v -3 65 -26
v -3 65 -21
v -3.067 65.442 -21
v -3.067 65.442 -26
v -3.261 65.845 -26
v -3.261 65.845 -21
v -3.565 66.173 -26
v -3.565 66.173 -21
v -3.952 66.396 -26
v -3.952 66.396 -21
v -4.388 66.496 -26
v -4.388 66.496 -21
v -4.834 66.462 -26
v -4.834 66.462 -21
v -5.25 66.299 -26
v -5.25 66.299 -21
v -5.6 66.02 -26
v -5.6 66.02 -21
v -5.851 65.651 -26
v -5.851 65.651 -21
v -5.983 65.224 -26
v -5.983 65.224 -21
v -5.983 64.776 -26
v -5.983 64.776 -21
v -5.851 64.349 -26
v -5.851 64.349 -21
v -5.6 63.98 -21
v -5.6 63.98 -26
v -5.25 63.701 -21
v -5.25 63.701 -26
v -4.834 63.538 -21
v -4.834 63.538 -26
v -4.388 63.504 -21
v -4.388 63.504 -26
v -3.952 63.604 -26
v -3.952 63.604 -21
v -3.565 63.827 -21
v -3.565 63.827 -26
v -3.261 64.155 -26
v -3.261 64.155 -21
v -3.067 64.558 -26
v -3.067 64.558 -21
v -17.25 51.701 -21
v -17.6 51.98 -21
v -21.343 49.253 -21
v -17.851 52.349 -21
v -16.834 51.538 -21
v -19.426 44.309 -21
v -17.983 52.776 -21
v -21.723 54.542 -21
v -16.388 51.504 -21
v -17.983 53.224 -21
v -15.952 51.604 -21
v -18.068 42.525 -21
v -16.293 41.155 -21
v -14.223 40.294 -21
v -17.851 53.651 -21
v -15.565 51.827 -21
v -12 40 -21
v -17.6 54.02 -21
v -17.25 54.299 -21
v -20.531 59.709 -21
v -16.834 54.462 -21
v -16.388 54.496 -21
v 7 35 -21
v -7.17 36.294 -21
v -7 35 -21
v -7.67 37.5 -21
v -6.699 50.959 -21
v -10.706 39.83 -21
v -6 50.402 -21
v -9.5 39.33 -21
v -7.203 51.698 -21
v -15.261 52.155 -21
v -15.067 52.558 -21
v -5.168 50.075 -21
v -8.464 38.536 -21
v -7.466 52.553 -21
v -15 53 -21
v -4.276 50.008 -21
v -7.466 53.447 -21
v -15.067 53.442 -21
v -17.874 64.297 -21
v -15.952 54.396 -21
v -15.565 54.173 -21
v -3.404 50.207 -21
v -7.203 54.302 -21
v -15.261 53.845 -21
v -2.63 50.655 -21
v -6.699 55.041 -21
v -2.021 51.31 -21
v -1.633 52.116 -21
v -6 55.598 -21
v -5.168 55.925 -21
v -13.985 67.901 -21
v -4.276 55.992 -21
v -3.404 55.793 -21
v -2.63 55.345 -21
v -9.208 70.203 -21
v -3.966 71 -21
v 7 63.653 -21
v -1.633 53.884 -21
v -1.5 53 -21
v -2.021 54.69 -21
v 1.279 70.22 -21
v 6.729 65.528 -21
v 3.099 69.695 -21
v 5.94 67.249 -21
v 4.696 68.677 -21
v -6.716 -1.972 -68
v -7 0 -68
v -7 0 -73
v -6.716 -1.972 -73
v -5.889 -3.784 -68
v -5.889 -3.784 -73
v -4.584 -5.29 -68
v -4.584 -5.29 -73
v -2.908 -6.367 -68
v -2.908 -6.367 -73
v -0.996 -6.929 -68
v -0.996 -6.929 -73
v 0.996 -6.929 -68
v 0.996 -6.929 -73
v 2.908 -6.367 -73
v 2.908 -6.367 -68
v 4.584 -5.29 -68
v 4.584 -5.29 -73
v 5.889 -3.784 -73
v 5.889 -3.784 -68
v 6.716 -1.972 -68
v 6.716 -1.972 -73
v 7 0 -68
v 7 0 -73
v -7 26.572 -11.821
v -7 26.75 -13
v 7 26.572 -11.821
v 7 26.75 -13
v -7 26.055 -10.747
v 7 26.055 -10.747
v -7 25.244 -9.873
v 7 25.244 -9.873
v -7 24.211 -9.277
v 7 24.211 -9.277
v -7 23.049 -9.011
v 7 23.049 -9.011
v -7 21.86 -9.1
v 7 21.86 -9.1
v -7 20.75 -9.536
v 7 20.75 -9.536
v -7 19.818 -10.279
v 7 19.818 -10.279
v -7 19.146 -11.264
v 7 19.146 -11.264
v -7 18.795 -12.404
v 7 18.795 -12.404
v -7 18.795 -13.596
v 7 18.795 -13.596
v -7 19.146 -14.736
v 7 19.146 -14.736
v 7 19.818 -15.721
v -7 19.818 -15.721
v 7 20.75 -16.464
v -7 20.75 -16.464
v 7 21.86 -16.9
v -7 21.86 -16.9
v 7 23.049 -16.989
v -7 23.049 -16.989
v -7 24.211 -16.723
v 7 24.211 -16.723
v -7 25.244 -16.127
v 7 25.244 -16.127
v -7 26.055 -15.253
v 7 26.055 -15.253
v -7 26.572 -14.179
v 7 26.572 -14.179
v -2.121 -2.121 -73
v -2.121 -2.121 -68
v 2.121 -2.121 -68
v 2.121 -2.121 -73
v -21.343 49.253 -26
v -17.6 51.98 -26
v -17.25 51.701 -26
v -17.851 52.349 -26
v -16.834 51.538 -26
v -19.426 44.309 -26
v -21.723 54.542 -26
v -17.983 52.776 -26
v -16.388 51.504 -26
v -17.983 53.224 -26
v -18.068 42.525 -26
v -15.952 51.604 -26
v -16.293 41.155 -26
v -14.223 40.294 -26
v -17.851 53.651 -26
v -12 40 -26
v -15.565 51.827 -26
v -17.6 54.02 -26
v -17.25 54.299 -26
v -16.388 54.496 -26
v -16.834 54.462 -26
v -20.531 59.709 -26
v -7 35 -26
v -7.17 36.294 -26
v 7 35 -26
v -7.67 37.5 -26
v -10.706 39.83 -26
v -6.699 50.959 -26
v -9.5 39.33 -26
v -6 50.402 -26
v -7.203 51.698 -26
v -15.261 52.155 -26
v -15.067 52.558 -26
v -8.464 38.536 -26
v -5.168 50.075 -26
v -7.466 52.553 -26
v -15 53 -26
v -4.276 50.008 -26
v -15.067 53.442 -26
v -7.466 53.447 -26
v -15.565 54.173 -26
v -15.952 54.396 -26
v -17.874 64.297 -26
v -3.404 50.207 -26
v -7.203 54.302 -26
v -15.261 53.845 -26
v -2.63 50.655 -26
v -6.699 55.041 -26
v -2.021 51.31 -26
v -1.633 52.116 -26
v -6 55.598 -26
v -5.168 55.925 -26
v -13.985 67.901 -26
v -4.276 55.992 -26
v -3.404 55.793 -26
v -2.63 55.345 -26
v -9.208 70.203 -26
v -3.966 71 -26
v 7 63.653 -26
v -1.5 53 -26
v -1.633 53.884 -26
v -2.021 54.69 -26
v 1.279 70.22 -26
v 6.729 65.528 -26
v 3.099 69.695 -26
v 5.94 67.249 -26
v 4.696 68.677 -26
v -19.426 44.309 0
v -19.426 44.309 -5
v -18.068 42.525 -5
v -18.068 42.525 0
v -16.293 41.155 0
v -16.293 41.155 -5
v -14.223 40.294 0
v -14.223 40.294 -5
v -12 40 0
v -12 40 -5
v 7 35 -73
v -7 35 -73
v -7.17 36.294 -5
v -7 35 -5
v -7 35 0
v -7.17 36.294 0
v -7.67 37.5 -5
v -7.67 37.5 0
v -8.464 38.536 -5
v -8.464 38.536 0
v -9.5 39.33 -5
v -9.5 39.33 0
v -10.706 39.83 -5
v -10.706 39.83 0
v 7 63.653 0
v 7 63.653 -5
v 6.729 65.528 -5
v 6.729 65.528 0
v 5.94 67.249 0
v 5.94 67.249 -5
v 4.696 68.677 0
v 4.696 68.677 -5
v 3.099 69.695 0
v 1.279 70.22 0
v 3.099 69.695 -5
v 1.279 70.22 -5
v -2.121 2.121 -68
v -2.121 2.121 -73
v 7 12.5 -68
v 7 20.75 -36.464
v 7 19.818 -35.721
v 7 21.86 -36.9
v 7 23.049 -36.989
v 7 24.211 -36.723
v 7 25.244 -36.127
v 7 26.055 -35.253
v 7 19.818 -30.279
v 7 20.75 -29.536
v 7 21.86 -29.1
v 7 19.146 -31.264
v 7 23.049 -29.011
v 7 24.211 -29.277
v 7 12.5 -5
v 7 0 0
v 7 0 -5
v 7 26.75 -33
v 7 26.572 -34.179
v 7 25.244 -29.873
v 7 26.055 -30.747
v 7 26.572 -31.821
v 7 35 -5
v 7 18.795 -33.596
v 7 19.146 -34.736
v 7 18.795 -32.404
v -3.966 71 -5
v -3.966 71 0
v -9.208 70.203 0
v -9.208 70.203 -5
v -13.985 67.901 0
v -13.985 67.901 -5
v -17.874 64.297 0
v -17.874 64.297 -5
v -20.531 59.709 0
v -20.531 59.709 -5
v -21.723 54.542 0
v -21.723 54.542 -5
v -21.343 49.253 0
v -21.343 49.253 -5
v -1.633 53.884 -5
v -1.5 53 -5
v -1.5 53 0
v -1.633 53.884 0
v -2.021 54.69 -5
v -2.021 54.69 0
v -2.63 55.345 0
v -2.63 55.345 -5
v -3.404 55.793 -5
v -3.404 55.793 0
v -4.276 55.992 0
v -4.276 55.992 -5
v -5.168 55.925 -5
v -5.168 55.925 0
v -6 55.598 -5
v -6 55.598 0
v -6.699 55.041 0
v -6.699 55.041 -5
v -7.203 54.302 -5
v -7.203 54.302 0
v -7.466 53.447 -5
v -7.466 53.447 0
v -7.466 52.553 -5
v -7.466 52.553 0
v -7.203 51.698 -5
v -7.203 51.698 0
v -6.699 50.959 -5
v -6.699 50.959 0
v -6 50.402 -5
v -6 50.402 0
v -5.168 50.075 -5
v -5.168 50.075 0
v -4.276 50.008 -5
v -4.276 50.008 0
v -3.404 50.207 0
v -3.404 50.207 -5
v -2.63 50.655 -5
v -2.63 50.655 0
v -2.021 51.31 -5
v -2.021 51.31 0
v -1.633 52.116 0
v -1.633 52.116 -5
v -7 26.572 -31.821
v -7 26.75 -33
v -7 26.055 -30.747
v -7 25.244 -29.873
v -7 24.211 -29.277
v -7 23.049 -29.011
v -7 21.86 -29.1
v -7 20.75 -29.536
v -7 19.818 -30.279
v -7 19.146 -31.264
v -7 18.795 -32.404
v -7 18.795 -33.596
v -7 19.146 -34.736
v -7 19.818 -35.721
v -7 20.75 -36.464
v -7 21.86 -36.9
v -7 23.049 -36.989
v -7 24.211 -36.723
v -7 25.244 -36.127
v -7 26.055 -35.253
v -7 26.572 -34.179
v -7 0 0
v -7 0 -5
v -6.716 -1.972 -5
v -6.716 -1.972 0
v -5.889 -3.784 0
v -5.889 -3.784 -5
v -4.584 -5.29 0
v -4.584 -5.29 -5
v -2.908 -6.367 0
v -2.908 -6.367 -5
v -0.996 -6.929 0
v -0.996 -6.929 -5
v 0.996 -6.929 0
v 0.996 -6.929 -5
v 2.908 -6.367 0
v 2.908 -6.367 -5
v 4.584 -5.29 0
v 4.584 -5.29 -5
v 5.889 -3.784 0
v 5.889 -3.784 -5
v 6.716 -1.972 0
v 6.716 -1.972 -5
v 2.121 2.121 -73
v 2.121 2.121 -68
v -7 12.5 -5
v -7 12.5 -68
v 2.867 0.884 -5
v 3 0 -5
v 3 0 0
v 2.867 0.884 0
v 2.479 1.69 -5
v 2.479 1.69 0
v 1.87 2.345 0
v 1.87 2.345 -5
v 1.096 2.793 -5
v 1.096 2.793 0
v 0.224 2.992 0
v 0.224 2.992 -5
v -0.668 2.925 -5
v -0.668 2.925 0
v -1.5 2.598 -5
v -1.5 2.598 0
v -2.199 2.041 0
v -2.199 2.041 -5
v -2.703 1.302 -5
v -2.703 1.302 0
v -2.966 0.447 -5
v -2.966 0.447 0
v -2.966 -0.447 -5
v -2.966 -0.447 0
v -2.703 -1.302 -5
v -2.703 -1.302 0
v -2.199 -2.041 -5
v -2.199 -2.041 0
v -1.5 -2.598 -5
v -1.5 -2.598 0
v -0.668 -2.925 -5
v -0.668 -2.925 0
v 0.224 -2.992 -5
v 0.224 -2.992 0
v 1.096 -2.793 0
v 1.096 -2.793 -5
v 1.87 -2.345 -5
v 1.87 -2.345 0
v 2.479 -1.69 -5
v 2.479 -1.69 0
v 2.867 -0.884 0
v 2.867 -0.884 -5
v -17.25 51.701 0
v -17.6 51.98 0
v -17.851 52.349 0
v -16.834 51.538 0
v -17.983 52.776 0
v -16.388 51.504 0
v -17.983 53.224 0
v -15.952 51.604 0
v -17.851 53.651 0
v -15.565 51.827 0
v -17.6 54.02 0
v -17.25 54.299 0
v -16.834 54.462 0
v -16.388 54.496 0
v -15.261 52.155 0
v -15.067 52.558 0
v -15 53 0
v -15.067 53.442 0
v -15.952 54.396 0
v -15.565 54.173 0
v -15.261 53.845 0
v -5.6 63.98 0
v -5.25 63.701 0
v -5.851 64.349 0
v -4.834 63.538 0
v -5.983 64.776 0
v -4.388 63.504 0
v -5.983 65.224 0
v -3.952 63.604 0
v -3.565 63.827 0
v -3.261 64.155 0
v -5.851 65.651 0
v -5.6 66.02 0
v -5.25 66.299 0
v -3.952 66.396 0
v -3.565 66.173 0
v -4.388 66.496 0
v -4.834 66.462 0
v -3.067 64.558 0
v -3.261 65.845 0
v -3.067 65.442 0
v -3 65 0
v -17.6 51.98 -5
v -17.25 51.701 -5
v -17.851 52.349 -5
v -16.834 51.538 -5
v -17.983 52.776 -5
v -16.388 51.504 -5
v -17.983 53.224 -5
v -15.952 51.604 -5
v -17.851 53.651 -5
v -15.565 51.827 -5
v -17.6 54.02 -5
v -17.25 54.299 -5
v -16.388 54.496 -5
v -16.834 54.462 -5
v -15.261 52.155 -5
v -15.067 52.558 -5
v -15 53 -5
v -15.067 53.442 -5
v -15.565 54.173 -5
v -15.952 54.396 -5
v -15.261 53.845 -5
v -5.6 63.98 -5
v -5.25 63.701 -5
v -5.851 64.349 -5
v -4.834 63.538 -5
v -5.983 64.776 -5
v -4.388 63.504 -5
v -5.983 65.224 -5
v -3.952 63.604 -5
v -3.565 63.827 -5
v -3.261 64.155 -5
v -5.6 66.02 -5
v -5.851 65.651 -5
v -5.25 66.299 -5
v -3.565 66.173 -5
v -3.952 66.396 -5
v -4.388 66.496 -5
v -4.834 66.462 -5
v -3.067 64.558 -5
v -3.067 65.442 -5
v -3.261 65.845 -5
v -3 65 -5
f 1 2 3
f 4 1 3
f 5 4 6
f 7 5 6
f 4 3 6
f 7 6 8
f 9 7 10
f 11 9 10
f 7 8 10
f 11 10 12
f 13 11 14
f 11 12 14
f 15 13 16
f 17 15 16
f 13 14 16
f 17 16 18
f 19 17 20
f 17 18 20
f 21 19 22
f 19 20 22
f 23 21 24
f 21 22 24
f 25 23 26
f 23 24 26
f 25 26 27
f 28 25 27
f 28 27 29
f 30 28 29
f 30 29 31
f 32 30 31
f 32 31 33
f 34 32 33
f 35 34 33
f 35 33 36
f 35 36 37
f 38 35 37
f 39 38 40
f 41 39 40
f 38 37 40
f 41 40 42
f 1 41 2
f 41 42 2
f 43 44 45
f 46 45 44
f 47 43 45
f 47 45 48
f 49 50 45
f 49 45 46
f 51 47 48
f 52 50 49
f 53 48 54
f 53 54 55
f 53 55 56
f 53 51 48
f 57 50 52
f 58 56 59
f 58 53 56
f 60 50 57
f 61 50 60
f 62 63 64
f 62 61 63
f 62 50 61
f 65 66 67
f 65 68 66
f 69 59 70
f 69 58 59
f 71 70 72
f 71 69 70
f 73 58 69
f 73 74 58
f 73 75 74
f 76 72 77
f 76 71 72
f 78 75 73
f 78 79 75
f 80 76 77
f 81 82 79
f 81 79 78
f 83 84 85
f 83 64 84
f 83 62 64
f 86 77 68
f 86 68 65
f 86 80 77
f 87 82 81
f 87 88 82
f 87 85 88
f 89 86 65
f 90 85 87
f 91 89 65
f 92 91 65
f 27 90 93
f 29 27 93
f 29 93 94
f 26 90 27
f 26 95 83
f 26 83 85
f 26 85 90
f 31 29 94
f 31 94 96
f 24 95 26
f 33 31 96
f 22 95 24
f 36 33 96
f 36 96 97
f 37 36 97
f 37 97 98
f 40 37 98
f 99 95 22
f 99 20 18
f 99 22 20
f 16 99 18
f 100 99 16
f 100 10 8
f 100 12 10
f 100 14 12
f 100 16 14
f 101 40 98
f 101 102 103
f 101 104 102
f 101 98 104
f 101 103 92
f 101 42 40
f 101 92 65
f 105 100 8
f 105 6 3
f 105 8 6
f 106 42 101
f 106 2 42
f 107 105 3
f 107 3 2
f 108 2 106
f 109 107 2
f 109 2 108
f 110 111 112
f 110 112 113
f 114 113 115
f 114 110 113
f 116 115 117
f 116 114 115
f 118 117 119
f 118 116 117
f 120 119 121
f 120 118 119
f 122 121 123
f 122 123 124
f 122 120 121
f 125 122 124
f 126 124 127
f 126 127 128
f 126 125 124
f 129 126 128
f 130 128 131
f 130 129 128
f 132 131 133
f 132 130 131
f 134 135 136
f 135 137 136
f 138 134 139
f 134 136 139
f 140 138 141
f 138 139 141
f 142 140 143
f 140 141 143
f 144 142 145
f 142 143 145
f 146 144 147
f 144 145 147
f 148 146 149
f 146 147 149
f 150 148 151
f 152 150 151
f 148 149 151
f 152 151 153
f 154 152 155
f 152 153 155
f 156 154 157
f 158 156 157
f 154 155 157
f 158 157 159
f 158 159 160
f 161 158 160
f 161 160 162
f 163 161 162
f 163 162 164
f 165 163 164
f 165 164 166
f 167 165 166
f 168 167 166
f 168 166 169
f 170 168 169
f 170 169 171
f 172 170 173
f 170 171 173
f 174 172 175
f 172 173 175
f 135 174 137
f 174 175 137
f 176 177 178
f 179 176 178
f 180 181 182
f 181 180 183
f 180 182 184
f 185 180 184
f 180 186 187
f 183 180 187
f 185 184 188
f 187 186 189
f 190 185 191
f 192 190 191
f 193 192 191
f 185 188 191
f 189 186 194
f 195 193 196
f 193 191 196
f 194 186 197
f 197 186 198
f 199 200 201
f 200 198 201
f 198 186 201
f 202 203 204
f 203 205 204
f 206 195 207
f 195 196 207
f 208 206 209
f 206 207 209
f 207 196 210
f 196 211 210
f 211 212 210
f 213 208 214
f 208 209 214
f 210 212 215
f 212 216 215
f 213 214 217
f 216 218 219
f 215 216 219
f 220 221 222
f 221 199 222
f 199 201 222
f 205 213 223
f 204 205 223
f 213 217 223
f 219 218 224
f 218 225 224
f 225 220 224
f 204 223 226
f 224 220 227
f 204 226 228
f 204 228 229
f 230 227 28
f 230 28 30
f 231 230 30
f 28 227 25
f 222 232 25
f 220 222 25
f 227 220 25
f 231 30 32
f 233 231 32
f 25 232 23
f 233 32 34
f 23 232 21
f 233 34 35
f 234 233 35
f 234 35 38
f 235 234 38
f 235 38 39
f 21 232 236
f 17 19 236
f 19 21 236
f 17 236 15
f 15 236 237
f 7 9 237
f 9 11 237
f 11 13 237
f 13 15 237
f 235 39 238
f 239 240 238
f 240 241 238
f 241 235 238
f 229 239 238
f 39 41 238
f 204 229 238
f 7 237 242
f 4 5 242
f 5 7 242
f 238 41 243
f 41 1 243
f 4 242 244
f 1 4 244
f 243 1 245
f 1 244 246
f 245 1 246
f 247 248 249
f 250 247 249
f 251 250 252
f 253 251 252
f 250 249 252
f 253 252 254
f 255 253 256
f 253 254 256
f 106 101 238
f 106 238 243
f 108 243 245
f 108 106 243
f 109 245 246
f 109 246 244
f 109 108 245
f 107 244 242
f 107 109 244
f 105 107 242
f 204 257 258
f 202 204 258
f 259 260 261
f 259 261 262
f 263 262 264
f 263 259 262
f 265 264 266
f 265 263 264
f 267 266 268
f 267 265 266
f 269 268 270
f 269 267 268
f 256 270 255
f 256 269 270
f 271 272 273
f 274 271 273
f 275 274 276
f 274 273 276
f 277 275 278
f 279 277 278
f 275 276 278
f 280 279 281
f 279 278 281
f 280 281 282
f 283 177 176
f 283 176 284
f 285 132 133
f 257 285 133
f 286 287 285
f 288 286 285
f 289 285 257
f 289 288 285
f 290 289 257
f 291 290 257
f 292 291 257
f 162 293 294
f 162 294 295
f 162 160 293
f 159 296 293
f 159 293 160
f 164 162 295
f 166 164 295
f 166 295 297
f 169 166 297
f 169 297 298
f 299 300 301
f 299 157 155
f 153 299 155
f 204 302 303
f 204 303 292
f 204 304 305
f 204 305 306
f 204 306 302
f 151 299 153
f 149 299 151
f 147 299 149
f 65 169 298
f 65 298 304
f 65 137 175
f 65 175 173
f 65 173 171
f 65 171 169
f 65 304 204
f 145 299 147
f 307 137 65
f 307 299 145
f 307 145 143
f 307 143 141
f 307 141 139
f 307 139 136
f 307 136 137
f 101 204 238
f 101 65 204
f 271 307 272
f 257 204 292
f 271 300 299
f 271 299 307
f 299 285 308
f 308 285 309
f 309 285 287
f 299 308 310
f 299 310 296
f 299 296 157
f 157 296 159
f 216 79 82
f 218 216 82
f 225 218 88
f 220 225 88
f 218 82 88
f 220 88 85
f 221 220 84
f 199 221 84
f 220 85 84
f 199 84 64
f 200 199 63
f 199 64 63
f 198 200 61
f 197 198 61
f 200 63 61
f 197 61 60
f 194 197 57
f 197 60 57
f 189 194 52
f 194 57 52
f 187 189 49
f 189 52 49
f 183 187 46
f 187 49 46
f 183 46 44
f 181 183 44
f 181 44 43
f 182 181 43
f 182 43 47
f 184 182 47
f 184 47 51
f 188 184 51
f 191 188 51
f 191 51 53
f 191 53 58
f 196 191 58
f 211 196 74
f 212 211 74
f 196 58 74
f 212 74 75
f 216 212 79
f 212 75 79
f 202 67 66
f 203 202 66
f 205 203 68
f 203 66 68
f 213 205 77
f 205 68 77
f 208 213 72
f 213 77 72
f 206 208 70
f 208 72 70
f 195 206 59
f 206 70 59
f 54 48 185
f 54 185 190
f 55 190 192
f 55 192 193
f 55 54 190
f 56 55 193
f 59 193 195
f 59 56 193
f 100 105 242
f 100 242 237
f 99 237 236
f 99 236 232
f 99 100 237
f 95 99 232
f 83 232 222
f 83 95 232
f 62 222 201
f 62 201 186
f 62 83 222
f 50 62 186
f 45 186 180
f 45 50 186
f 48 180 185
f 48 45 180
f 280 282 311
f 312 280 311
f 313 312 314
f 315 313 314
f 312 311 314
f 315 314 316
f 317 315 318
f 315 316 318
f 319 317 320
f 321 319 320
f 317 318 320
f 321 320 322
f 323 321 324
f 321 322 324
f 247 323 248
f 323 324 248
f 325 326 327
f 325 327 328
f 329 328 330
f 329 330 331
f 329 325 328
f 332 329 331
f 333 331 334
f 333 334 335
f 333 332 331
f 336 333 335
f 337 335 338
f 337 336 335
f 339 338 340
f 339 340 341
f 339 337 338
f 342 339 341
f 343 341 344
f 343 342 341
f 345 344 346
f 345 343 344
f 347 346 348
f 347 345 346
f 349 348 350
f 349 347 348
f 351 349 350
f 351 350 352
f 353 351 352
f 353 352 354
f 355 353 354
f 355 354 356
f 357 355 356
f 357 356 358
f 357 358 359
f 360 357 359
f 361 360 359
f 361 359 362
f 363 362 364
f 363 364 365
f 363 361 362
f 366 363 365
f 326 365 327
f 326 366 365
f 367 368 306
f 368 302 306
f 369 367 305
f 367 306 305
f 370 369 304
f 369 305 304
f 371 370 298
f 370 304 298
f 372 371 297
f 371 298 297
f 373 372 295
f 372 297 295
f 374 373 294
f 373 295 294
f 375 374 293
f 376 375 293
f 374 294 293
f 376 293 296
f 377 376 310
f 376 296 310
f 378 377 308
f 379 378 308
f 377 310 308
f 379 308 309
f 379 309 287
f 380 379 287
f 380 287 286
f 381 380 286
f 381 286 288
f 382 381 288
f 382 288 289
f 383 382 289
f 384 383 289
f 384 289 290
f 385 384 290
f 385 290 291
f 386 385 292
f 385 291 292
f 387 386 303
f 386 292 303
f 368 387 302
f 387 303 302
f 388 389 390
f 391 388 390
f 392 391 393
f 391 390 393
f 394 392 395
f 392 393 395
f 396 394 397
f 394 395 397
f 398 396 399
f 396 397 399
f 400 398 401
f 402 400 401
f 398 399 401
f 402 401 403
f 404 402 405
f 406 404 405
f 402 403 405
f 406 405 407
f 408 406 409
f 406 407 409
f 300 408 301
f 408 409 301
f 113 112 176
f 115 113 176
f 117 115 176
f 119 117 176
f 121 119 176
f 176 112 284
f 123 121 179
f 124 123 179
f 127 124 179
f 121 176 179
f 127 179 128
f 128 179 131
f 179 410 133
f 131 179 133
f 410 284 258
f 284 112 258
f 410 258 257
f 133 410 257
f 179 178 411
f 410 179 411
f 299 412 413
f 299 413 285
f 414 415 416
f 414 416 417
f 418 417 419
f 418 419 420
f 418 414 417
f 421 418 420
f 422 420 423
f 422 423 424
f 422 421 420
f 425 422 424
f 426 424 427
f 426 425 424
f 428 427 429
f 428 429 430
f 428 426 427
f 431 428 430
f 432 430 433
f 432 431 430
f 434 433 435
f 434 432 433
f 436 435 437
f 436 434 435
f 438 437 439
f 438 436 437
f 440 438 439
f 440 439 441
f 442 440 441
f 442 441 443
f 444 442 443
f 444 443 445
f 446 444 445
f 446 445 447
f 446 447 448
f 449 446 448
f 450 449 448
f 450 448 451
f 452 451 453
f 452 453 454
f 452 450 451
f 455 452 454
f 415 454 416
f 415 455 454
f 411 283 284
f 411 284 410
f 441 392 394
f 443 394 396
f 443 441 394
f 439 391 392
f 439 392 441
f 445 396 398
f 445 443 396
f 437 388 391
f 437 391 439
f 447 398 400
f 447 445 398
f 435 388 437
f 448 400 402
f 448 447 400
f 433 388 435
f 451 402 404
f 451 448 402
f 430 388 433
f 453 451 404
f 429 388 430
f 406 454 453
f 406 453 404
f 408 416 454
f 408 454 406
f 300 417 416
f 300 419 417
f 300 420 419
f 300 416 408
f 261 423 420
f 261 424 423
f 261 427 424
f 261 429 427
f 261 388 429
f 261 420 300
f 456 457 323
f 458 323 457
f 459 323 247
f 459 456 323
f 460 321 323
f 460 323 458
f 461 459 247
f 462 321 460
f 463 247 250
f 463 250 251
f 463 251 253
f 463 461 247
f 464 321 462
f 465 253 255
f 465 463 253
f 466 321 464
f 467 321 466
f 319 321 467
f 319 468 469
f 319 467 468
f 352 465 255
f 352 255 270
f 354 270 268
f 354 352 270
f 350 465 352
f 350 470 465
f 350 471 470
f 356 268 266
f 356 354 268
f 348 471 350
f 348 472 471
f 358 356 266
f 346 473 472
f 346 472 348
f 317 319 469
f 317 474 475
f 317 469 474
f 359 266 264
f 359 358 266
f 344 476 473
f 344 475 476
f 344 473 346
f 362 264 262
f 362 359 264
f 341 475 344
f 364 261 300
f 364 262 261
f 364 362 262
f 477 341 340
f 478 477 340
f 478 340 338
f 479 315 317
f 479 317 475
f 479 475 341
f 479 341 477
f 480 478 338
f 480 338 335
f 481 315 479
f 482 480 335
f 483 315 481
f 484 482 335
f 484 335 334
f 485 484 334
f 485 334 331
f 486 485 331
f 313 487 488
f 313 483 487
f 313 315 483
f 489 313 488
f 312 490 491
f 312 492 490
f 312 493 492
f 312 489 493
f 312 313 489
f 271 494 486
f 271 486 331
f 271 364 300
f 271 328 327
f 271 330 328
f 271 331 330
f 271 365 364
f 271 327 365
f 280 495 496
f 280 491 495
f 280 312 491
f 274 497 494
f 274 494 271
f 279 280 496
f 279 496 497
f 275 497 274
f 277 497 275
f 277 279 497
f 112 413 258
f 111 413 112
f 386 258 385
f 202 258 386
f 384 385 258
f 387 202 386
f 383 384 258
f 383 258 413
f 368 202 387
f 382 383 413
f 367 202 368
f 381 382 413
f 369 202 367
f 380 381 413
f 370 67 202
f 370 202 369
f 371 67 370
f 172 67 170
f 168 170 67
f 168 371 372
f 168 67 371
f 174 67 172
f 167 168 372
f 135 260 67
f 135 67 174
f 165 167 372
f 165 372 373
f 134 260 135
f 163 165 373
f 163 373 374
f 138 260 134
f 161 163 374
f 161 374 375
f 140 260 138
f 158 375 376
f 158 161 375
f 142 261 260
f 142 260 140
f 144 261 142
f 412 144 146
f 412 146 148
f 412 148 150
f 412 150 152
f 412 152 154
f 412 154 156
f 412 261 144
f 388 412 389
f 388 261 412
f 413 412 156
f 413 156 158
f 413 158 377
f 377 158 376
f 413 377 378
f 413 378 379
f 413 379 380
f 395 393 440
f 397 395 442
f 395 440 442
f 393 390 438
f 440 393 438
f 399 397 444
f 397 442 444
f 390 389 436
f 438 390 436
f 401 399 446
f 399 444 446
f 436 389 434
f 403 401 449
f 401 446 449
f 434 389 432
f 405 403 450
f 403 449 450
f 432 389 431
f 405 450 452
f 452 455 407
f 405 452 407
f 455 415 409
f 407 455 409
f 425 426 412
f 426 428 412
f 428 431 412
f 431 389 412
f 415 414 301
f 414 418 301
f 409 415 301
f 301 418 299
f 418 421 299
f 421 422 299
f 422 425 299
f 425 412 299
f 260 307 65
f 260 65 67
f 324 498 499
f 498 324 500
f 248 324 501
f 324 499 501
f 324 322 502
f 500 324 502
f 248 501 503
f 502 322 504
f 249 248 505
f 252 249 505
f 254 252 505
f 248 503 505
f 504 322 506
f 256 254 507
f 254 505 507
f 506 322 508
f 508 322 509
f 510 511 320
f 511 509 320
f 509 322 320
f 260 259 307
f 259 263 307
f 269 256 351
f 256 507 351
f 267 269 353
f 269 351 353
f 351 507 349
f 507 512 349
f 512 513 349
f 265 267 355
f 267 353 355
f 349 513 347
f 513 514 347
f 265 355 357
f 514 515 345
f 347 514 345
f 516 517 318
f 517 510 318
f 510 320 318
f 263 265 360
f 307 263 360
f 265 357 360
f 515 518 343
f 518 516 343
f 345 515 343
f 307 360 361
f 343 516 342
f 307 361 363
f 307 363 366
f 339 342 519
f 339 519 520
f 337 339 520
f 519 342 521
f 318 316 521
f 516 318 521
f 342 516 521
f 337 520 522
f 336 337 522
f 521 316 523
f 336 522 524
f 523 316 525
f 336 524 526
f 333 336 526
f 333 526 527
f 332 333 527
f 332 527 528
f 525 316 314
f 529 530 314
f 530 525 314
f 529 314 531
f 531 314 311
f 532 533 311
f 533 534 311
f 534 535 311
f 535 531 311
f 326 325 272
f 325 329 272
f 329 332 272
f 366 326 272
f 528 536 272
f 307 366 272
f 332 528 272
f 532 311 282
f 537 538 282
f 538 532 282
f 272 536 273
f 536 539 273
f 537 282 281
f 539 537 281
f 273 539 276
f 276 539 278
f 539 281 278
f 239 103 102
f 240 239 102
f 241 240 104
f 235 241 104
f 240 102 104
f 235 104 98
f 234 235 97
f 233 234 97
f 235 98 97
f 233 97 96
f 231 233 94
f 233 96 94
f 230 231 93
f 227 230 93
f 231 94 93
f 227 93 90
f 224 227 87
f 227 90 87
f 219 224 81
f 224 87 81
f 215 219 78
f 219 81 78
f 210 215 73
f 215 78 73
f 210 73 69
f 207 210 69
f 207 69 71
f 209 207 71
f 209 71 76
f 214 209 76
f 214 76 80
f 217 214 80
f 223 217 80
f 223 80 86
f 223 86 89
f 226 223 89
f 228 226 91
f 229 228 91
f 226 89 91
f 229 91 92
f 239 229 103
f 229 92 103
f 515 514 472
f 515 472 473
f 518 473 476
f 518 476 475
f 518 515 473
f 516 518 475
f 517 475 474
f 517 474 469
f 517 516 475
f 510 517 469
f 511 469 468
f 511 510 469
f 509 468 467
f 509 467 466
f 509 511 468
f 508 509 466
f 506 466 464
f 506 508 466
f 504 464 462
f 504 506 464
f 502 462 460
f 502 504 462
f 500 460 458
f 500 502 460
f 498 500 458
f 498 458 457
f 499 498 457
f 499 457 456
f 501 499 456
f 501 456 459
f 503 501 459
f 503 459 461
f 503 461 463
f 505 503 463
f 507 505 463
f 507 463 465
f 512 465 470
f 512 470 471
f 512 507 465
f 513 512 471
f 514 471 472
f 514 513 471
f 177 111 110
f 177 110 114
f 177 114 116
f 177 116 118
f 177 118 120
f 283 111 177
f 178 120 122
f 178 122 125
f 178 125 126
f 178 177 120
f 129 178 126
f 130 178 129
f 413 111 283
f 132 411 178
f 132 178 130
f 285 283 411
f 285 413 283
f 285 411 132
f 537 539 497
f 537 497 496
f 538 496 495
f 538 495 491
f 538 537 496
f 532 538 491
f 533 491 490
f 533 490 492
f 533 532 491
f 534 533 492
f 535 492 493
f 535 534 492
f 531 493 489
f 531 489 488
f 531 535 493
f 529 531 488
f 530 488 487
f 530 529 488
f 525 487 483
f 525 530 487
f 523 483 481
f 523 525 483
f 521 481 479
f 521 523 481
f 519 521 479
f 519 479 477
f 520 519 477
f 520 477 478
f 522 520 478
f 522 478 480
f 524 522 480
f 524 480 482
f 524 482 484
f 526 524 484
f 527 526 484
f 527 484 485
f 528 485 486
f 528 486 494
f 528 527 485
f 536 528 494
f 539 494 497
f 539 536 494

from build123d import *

# Parameters (mm, degrees)
SKETCH002_R       = 1.5
SKETCH002_R_2     = 3
PAD_DEPTH         = 5
SKETCH003_W       = 14
SKETCH003_H       = 22.5
PAD001_DEPTH      = 63
SKETCH004_W       = 4.24264
SKETCH004_H       = 4.24264
PAD002_DEPTH      = 5
SKETCH005_R       = 1.5
SKETCH005_R_2     = 3
PAD003_DEPTH      = 5
SKETCH006_R       = 4
POCKET_DEPTH      = 21.777567
POCKET_DEPTH_BACK = 7.001


with BuildPart() as part:
    # Sketch002 → Pad (new body)
    with BuildSketch(Plane.XY):
        with BuildLine():
            ThreePointArc((7, 63.652914), (5.369142, 68.007903), (1.278873, 70.220442))
            ThreePointArc((1.278873, 70.220442), (-17.873705, 64.296837), (-19.425905, 44.309315))
            ThreePointArc((-19.425905, 44.309315), (-16.29285, 41.155365), (-12, 40))
            ThreePointArc((-7, 35), (-8.464466, 38.535534), (-12, 40))
            Line((-7, 35), (-7, 0))
            ThreePointArc((-7, 0), (0, -7), (7, 0))
            Line((7, 0), (7, 63.652914))
        make_face()
        with Locations((-16.5, 53)):
            Circle(SKETCH002_R, mode=Mode.SUBTRACT)
        with Locations((-4.5, 53)):
            Circle(SKETCH002_R_2, mode=Mode.SUBTRACT)
        with Locations((-4.5, 65)):
            Circle(SKETCH002_R, mode=Mode.SUBTRACT)
        Circle(SKETCH002_R_2, mode=Mode.SUBTRACT)
    extrude(amount=PAD_DEPTH)

    # Sketch003 → Pad001 (join)
    with BuildSketch(Plane.XY):
        with Locations((0, 23.75)):
            Rectangle(SKETCH003_W, SKETCH003_H)
    extrude(amount=-PAD001_DEPTH)

    # Sketch004 (on DatumPlane) → Pad002 (join)
    with BuildSketch(Plane.XY.offset(-63)):
        with BuildLine():
            ThreePointArc((-7, 0), (0, -7), (7, 0))
            Line((7, 0), (7, 35))
            Line((7, 35), (-7, 35))
            Line((-7, 35), (-7, 0))
        make_face()
        Rectangle(SKETCH004_W, SKETCH004_H, mode=Mode.SUBTRACT)
    extrude(amount=-PAD002_DEPTH)

    # Sketch005 → Pad003 (join)
    with BuildSketch(Plane.XY.offset(-16)):
        with BuildLine():
            Line((-7, 35), (7, 35))
            Line((7, 35), (7, 63.652914))
            ThreePointArc((7, 63.652914), (5.369142, 68.007903), (1.278873, 70.220442))
            ThreePointArc((1.278873, 70.220442), (-17.873705, 64.296837), (-19.425905, 44.309315))
            ThreePointArc((-19.425905, 44.309315), (-16.29285, 41.155365), (-12, 40))
            ThreePointArc((-7, 35), (-8.464466, 38.535534), (-12, 40))
        make_face()
        with Locations((-16.5, 53)):
            Circle(SKETCH005_R, mode=Mode.SUBTRACT)
        with Locations((-4.5, 53)):
            Circle(SKETCH005_R_2, mode=Mode.SUBTRACT)
        with Locations((-4.5, 65)):
            Circle(SKETCH005_R, mode=Mode.SUBTRACT)
    extrude(amount=-PAD003_DEPTH)

    # Sketch006 → Pocket (cut, two sides)
    with BuildSketch(Plane.YZ) as pocket_sk:
        with Locations((22.75, -8)):
            Circle(SKETCH006_R)
        with Locations((22.75, -28)):
            Circle(SKETCH006_R)
    extrude(amount=-POCKET_DEPTH, mode=Mode.SUBTRACT)
    extrude(pocket_sk.sketch, amount=POCKET_DEPTH_BACK, mode=Mode.SUBTRACT)


with BuildPart() as part_1:
    # Body placement: moved
    add(part.part.moved(Location((0, 0, -5))))


solid = part_1.part
